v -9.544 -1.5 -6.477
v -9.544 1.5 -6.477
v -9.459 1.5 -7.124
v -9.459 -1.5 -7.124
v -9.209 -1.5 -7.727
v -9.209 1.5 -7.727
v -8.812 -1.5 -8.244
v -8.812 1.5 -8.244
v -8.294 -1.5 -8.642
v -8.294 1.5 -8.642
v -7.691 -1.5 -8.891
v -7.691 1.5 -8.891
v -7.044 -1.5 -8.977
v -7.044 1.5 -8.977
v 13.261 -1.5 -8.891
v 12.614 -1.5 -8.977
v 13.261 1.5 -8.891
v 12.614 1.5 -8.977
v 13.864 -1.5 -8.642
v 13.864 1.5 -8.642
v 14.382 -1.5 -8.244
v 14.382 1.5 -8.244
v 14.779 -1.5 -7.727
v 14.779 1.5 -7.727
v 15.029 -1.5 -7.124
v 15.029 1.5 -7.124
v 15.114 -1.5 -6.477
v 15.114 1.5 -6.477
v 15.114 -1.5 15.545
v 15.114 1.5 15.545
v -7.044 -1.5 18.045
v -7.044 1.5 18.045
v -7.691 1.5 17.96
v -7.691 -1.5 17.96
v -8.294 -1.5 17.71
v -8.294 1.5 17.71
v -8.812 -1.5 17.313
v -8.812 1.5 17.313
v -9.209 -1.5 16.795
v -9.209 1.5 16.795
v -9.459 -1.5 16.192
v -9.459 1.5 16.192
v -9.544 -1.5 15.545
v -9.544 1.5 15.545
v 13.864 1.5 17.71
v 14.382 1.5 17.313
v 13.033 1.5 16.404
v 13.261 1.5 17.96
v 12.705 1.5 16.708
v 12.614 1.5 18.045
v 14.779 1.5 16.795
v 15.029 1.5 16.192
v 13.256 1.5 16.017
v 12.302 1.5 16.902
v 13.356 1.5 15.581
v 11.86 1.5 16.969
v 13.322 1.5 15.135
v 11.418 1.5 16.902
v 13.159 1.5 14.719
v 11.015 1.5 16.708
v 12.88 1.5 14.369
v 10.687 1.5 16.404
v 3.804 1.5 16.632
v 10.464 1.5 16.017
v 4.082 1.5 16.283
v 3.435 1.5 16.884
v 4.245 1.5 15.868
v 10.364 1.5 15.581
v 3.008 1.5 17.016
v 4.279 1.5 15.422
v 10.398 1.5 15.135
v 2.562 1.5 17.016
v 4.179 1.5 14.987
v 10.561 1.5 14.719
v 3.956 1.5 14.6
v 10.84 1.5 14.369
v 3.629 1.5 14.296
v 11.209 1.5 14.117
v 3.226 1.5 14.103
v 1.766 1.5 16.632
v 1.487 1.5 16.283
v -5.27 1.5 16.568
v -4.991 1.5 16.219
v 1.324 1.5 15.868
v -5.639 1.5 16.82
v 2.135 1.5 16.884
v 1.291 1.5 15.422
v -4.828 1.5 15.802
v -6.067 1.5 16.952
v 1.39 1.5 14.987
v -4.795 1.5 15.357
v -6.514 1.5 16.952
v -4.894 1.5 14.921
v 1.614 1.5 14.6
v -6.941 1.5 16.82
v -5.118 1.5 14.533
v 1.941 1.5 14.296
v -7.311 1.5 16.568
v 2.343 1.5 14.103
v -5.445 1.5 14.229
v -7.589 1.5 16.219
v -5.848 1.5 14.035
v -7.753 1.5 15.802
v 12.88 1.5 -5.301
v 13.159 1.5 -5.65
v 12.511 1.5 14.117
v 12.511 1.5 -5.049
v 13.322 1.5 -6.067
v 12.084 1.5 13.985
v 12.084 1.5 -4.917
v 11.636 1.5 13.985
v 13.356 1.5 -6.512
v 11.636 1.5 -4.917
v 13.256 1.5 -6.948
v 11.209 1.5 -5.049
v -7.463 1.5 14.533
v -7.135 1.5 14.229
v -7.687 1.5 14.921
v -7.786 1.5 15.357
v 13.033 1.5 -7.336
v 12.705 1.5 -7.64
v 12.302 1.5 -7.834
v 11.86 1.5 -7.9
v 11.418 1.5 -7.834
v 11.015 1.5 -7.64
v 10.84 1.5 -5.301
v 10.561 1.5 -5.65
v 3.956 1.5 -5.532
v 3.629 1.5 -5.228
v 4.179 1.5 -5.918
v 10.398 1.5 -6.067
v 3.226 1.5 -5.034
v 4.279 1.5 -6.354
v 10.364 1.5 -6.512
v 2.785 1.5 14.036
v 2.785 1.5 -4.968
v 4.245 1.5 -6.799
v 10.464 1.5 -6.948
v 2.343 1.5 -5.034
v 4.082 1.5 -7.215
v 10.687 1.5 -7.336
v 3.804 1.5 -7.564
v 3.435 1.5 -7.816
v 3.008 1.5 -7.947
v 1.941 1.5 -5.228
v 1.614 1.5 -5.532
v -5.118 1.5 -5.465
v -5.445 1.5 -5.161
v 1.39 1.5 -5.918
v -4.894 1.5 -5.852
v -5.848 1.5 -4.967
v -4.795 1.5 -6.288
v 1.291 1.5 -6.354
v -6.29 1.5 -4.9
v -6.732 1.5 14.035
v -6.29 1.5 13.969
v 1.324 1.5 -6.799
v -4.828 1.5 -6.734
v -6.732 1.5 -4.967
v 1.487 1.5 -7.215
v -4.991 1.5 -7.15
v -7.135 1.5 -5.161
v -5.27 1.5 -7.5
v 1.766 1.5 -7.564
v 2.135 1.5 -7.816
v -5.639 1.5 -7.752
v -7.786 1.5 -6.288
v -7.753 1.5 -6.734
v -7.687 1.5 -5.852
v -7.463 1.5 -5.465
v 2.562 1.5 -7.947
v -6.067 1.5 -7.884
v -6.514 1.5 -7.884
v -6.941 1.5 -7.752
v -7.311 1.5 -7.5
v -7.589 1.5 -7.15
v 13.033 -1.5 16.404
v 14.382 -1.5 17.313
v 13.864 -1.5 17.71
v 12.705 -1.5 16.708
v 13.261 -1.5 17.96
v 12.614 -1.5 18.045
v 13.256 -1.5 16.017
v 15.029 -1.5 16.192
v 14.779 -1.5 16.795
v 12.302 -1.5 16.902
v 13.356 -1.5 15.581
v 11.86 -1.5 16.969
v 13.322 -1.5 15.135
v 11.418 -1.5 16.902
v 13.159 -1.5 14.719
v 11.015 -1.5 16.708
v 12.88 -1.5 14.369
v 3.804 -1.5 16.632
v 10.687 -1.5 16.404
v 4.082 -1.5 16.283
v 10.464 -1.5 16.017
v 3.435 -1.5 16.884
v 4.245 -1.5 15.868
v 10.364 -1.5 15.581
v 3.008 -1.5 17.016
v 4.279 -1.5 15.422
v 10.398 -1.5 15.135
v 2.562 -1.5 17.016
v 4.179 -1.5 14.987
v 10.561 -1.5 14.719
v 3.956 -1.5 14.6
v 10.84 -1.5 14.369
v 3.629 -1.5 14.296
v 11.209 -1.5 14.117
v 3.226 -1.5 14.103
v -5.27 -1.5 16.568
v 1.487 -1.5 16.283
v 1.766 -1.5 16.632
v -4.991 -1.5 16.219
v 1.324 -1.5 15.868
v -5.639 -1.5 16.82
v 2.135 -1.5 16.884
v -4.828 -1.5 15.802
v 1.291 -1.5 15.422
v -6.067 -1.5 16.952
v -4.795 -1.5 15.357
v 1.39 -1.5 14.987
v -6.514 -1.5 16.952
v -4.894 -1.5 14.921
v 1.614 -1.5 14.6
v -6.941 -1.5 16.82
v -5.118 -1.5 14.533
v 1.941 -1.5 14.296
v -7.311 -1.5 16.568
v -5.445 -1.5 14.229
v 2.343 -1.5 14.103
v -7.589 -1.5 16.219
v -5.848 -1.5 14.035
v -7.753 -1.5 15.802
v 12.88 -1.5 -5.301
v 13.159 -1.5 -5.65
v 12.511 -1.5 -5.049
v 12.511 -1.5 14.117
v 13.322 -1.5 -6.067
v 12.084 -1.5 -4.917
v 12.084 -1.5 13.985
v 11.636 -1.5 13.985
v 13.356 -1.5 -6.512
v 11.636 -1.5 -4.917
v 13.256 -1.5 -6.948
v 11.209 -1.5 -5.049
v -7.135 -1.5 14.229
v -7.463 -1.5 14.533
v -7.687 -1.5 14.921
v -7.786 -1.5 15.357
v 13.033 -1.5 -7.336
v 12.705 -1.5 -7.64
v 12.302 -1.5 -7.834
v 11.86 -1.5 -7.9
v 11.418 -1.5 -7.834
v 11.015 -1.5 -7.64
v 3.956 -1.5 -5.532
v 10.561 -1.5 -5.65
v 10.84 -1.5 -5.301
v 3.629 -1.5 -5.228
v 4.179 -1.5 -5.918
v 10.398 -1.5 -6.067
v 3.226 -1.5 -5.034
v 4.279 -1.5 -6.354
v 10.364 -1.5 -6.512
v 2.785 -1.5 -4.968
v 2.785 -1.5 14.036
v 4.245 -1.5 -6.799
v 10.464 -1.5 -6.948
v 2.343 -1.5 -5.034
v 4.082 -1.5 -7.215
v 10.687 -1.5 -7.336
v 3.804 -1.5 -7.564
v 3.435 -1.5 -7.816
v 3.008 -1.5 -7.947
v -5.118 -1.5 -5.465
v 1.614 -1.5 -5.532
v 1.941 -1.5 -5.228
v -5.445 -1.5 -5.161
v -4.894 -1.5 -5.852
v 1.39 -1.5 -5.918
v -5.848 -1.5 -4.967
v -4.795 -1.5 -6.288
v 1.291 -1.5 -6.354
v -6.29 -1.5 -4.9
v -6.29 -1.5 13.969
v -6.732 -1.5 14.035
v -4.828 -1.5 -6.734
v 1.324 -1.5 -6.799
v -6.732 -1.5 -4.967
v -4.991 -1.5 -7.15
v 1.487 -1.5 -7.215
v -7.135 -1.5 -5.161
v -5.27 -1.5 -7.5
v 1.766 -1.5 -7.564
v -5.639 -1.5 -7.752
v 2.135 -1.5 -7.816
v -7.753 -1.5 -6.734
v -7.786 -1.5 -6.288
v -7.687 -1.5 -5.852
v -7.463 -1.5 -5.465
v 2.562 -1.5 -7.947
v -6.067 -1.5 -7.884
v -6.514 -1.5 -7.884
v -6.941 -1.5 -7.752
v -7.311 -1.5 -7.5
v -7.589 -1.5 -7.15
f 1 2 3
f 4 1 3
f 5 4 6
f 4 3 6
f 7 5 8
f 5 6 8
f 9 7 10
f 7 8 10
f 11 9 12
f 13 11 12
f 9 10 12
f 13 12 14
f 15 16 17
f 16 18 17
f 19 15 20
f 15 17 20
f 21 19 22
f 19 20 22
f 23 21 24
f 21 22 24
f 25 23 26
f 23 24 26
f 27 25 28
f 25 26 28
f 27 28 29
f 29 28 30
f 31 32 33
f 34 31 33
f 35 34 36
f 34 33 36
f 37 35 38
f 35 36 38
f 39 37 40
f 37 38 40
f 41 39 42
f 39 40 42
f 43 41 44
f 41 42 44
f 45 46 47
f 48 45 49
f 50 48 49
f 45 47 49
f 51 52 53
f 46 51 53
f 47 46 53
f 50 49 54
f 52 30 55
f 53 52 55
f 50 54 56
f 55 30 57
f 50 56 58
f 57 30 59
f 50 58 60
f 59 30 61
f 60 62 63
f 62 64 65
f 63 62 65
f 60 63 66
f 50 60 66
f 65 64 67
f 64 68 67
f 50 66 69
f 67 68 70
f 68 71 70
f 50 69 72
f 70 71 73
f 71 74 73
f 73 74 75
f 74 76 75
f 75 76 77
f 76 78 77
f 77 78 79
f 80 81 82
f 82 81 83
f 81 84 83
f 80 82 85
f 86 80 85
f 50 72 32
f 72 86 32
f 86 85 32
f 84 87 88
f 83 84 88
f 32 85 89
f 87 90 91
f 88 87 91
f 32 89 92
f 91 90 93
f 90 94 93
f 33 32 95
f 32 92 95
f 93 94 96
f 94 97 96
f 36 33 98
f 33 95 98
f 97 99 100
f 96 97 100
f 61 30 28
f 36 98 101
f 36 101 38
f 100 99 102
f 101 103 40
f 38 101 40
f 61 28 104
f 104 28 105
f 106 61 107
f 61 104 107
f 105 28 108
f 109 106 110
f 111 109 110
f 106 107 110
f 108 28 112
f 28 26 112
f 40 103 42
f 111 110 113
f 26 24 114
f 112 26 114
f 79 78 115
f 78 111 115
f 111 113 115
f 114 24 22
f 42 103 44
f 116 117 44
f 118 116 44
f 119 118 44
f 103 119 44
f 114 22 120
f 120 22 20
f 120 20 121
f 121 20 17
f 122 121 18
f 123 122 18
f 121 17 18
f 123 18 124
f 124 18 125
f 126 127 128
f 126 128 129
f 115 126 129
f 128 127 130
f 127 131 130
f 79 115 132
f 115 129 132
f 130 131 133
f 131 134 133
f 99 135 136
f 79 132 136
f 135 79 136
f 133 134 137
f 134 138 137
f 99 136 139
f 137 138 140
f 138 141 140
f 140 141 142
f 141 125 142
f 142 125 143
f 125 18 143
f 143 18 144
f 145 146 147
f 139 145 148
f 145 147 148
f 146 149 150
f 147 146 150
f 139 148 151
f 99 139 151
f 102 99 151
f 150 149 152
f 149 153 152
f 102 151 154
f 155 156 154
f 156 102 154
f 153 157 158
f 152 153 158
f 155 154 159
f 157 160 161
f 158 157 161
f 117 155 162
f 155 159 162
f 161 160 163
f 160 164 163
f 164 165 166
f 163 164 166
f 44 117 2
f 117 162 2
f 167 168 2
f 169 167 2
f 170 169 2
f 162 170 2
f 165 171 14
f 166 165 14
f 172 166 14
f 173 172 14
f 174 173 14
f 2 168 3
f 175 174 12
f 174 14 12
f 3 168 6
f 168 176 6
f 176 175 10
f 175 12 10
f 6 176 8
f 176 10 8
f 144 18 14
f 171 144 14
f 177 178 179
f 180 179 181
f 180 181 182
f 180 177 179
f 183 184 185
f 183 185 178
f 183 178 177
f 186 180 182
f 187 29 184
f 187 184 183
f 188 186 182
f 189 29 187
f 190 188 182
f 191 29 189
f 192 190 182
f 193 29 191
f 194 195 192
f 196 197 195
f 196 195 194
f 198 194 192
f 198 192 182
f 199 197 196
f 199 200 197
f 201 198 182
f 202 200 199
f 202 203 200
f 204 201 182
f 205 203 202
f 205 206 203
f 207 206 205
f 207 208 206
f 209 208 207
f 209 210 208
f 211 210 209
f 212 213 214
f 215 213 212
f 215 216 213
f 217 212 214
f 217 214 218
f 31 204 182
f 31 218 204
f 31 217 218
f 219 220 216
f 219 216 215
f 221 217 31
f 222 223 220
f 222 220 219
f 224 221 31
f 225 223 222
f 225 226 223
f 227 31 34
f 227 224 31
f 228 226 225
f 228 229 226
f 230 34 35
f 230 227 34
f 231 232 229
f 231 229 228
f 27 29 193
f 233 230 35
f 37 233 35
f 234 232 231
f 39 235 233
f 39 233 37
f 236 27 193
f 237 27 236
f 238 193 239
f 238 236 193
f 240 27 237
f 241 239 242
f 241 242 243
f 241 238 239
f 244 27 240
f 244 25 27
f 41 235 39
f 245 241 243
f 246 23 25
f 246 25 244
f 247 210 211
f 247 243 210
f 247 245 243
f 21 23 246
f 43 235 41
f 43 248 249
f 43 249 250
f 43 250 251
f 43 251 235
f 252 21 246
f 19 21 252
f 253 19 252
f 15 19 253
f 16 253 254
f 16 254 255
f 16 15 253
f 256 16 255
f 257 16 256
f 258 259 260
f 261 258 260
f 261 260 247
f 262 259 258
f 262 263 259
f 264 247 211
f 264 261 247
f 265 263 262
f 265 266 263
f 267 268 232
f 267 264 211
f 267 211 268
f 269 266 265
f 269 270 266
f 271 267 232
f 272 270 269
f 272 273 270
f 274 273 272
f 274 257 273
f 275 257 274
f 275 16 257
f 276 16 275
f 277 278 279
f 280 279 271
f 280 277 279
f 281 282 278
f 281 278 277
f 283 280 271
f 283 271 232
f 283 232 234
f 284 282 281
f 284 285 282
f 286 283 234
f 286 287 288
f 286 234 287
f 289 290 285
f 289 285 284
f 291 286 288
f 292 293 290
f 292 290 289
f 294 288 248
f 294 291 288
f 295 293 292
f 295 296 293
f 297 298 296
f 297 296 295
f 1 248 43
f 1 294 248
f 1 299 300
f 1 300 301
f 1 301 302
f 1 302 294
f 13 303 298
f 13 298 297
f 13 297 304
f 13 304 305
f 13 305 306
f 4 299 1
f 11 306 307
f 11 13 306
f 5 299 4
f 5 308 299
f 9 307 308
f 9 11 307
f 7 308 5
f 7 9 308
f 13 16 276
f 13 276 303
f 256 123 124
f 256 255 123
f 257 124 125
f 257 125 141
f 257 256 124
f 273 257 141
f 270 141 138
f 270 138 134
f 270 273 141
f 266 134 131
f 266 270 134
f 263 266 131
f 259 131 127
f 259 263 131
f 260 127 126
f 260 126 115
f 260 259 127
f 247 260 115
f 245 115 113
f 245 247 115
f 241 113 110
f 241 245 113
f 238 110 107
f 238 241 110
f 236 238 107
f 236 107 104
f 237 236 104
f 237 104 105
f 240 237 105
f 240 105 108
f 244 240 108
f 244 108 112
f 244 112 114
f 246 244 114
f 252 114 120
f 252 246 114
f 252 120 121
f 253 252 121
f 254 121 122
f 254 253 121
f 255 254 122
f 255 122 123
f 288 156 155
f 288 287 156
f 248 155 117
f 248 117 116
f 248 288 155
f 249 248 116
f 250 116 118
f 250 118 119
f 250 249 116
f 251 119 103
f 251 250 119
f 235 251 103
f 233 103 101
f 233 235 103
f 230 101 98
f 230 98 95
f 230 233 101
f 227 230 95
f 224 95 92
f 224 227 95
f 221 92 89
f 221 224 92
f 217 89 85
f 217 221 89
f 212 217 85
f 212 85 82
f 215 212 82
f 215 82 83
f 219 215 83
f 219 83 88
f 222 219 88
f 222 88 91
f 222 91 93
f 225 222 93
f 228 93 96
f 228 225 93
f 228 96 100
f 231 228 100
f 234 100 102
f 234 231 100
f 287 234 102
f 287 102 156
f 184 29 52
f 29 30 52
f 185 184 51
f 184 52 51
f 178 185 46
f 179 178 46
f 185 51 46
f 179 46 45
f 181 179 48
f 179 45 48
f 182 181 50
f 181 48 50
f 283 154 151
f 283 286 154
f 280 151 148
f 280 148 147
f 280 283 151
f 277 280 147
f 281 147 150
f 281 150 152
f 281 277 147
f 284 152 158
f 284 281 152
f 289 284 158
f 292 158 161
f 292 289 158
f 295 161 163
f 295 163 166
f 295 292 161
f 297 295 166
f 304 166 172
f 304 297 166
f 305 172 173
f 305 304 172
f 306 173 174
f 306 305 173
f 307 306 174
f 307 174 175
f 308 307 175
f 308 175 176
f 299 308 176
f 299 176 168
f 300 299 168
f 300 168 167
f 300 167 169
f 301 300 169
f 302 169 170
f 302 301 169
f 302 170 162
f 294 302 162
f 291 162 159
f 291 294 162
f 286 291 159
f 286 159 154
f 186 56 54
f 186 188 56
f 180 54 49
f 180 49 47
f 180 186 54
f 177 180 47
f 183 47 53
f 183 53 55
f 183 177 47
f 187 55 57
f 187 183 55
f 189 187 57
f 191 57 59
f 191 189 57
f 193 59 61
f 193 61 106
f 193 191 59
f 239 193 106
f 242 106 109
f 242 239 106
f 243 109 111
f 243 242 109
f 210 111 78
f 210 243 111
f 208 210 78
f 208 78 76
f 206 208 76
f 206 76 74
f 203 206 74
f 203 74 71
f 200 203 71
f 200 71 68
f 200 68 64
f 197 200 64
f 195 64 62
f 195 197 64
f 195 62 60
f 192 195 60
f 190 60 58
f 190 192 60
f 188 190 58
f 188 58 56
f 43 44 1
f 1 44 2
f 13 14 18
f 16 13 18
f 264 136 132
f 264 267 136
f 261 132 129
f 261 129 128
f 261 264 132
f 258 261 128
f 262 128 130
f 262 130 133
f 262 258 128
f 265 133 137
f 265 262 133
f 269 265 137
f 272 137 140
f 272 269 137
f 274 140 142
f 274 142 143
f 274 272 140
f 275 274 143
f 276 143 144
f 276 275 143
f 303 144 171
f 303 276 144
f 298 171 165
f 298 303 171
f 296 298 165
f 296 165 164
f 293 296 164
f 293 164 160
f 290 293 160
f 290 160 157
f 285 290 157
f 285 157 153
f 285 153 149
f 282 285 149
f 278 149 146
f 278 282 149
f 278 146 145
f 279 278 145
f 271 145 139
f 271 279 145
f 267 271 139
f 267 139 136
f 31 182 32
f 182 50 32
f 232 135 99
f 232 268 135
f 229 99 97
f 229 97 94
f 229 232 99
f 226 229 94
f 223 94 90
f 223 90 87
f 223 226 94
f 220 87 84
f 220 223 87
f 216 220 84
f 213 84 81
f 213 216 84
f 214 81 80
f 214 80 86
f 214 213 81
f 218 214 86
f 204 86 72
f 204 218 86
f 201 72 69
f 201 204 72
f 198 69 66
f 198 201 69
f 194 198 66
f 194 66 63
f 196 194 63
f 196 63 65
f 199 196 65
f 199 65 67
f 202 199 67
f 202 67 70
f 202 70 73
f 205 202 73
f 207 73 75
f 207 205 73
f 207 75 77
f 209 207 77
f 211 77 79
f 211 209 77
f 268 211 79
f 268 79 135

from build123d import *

# Parameters (mm, degrees)
CROQUIS1_R              = 1.498200291
CROQUIS1_R_2            = 1.5
SALIENTE_EXTRUIR1_DEPTH = 1.5


with BuildPart() as part:
    # Croquis1 → Saliente-Extruir1 (new, symmetric)
    with BuildSketch(Plane(origin=(0, 0, 0), x_dir=(1, 0, 0), z_dir=(0, 1, 0))):
        with BuildLine():
            Line((-7.044335514, 8.976515941), (12.614040425, 8.976515941))
            ThreePointArc((12.614040425, 8.976515941), (14.381807378, 8.244282894), (15.114040425, 6.476515941))
            Line((15.114040425, 6.476515941), (15.114040425, -15.544827048))
            ThreePointArc((15.114040425, -15.544827048), (14.381807378, -17.312594001), (12.614040425, -18.044827048))
            Line((12.614040425, -18.044827048), (-7.044335514, -18.044827048))
            ThreePointArc((-7.044335514, -18.044827048), (-8.812102467, -17.312594001), (-9.544335514, -15.544827048))
            Line((-9.544335514, -15.544827048), (-9.544335514, 6.476515941))
            ThreePointArc((-9.544335514, 6.476515941), (-8.812102467, 8.244282894), (-7.044335514, 8.976515941))
        make_face()
        with Locations(Location((2.784852456, 6.465844447, 0), (0, 0, 270))):
            Circle(CROQUIS1_R, mode=Mode.SUBTRACT)
        with Locations(Location((2.784852456, -15.534155553, 0), (0, 0, 90))):
            Circle(CROQUIS1_R, mode=Mode.SUBTRACT)
        with Locations(Location((-6.290312273, 6.400402587, 0), (0, 0, 270))):
            Circle(CROQUIS1_R_2, mode=Mode.SUBTRACT)
        with Locations(Location((-6.290312273, -15.468713694, 0), (0, 0, 90))):
            Circle(CROQUIS1_R_2, mode=Mode.SUBTRACT)
        with Locations(Location((11.860017184, -15.468713694, 0), (0, 0, 270))):
            Circle(CROQUIS1_R_2, mode=Mode.SUBTRACT)
        with Locations(Location((11.860017184, 6.400402587, 0), (0, 0, 90))):
            Circle(CROQUIS1_R_2, mode=Mode.SUBTRACT)
    extrude(amount=SALIENTE_EXTRUIR1_DEPTH, both=True)


solid = part.part
